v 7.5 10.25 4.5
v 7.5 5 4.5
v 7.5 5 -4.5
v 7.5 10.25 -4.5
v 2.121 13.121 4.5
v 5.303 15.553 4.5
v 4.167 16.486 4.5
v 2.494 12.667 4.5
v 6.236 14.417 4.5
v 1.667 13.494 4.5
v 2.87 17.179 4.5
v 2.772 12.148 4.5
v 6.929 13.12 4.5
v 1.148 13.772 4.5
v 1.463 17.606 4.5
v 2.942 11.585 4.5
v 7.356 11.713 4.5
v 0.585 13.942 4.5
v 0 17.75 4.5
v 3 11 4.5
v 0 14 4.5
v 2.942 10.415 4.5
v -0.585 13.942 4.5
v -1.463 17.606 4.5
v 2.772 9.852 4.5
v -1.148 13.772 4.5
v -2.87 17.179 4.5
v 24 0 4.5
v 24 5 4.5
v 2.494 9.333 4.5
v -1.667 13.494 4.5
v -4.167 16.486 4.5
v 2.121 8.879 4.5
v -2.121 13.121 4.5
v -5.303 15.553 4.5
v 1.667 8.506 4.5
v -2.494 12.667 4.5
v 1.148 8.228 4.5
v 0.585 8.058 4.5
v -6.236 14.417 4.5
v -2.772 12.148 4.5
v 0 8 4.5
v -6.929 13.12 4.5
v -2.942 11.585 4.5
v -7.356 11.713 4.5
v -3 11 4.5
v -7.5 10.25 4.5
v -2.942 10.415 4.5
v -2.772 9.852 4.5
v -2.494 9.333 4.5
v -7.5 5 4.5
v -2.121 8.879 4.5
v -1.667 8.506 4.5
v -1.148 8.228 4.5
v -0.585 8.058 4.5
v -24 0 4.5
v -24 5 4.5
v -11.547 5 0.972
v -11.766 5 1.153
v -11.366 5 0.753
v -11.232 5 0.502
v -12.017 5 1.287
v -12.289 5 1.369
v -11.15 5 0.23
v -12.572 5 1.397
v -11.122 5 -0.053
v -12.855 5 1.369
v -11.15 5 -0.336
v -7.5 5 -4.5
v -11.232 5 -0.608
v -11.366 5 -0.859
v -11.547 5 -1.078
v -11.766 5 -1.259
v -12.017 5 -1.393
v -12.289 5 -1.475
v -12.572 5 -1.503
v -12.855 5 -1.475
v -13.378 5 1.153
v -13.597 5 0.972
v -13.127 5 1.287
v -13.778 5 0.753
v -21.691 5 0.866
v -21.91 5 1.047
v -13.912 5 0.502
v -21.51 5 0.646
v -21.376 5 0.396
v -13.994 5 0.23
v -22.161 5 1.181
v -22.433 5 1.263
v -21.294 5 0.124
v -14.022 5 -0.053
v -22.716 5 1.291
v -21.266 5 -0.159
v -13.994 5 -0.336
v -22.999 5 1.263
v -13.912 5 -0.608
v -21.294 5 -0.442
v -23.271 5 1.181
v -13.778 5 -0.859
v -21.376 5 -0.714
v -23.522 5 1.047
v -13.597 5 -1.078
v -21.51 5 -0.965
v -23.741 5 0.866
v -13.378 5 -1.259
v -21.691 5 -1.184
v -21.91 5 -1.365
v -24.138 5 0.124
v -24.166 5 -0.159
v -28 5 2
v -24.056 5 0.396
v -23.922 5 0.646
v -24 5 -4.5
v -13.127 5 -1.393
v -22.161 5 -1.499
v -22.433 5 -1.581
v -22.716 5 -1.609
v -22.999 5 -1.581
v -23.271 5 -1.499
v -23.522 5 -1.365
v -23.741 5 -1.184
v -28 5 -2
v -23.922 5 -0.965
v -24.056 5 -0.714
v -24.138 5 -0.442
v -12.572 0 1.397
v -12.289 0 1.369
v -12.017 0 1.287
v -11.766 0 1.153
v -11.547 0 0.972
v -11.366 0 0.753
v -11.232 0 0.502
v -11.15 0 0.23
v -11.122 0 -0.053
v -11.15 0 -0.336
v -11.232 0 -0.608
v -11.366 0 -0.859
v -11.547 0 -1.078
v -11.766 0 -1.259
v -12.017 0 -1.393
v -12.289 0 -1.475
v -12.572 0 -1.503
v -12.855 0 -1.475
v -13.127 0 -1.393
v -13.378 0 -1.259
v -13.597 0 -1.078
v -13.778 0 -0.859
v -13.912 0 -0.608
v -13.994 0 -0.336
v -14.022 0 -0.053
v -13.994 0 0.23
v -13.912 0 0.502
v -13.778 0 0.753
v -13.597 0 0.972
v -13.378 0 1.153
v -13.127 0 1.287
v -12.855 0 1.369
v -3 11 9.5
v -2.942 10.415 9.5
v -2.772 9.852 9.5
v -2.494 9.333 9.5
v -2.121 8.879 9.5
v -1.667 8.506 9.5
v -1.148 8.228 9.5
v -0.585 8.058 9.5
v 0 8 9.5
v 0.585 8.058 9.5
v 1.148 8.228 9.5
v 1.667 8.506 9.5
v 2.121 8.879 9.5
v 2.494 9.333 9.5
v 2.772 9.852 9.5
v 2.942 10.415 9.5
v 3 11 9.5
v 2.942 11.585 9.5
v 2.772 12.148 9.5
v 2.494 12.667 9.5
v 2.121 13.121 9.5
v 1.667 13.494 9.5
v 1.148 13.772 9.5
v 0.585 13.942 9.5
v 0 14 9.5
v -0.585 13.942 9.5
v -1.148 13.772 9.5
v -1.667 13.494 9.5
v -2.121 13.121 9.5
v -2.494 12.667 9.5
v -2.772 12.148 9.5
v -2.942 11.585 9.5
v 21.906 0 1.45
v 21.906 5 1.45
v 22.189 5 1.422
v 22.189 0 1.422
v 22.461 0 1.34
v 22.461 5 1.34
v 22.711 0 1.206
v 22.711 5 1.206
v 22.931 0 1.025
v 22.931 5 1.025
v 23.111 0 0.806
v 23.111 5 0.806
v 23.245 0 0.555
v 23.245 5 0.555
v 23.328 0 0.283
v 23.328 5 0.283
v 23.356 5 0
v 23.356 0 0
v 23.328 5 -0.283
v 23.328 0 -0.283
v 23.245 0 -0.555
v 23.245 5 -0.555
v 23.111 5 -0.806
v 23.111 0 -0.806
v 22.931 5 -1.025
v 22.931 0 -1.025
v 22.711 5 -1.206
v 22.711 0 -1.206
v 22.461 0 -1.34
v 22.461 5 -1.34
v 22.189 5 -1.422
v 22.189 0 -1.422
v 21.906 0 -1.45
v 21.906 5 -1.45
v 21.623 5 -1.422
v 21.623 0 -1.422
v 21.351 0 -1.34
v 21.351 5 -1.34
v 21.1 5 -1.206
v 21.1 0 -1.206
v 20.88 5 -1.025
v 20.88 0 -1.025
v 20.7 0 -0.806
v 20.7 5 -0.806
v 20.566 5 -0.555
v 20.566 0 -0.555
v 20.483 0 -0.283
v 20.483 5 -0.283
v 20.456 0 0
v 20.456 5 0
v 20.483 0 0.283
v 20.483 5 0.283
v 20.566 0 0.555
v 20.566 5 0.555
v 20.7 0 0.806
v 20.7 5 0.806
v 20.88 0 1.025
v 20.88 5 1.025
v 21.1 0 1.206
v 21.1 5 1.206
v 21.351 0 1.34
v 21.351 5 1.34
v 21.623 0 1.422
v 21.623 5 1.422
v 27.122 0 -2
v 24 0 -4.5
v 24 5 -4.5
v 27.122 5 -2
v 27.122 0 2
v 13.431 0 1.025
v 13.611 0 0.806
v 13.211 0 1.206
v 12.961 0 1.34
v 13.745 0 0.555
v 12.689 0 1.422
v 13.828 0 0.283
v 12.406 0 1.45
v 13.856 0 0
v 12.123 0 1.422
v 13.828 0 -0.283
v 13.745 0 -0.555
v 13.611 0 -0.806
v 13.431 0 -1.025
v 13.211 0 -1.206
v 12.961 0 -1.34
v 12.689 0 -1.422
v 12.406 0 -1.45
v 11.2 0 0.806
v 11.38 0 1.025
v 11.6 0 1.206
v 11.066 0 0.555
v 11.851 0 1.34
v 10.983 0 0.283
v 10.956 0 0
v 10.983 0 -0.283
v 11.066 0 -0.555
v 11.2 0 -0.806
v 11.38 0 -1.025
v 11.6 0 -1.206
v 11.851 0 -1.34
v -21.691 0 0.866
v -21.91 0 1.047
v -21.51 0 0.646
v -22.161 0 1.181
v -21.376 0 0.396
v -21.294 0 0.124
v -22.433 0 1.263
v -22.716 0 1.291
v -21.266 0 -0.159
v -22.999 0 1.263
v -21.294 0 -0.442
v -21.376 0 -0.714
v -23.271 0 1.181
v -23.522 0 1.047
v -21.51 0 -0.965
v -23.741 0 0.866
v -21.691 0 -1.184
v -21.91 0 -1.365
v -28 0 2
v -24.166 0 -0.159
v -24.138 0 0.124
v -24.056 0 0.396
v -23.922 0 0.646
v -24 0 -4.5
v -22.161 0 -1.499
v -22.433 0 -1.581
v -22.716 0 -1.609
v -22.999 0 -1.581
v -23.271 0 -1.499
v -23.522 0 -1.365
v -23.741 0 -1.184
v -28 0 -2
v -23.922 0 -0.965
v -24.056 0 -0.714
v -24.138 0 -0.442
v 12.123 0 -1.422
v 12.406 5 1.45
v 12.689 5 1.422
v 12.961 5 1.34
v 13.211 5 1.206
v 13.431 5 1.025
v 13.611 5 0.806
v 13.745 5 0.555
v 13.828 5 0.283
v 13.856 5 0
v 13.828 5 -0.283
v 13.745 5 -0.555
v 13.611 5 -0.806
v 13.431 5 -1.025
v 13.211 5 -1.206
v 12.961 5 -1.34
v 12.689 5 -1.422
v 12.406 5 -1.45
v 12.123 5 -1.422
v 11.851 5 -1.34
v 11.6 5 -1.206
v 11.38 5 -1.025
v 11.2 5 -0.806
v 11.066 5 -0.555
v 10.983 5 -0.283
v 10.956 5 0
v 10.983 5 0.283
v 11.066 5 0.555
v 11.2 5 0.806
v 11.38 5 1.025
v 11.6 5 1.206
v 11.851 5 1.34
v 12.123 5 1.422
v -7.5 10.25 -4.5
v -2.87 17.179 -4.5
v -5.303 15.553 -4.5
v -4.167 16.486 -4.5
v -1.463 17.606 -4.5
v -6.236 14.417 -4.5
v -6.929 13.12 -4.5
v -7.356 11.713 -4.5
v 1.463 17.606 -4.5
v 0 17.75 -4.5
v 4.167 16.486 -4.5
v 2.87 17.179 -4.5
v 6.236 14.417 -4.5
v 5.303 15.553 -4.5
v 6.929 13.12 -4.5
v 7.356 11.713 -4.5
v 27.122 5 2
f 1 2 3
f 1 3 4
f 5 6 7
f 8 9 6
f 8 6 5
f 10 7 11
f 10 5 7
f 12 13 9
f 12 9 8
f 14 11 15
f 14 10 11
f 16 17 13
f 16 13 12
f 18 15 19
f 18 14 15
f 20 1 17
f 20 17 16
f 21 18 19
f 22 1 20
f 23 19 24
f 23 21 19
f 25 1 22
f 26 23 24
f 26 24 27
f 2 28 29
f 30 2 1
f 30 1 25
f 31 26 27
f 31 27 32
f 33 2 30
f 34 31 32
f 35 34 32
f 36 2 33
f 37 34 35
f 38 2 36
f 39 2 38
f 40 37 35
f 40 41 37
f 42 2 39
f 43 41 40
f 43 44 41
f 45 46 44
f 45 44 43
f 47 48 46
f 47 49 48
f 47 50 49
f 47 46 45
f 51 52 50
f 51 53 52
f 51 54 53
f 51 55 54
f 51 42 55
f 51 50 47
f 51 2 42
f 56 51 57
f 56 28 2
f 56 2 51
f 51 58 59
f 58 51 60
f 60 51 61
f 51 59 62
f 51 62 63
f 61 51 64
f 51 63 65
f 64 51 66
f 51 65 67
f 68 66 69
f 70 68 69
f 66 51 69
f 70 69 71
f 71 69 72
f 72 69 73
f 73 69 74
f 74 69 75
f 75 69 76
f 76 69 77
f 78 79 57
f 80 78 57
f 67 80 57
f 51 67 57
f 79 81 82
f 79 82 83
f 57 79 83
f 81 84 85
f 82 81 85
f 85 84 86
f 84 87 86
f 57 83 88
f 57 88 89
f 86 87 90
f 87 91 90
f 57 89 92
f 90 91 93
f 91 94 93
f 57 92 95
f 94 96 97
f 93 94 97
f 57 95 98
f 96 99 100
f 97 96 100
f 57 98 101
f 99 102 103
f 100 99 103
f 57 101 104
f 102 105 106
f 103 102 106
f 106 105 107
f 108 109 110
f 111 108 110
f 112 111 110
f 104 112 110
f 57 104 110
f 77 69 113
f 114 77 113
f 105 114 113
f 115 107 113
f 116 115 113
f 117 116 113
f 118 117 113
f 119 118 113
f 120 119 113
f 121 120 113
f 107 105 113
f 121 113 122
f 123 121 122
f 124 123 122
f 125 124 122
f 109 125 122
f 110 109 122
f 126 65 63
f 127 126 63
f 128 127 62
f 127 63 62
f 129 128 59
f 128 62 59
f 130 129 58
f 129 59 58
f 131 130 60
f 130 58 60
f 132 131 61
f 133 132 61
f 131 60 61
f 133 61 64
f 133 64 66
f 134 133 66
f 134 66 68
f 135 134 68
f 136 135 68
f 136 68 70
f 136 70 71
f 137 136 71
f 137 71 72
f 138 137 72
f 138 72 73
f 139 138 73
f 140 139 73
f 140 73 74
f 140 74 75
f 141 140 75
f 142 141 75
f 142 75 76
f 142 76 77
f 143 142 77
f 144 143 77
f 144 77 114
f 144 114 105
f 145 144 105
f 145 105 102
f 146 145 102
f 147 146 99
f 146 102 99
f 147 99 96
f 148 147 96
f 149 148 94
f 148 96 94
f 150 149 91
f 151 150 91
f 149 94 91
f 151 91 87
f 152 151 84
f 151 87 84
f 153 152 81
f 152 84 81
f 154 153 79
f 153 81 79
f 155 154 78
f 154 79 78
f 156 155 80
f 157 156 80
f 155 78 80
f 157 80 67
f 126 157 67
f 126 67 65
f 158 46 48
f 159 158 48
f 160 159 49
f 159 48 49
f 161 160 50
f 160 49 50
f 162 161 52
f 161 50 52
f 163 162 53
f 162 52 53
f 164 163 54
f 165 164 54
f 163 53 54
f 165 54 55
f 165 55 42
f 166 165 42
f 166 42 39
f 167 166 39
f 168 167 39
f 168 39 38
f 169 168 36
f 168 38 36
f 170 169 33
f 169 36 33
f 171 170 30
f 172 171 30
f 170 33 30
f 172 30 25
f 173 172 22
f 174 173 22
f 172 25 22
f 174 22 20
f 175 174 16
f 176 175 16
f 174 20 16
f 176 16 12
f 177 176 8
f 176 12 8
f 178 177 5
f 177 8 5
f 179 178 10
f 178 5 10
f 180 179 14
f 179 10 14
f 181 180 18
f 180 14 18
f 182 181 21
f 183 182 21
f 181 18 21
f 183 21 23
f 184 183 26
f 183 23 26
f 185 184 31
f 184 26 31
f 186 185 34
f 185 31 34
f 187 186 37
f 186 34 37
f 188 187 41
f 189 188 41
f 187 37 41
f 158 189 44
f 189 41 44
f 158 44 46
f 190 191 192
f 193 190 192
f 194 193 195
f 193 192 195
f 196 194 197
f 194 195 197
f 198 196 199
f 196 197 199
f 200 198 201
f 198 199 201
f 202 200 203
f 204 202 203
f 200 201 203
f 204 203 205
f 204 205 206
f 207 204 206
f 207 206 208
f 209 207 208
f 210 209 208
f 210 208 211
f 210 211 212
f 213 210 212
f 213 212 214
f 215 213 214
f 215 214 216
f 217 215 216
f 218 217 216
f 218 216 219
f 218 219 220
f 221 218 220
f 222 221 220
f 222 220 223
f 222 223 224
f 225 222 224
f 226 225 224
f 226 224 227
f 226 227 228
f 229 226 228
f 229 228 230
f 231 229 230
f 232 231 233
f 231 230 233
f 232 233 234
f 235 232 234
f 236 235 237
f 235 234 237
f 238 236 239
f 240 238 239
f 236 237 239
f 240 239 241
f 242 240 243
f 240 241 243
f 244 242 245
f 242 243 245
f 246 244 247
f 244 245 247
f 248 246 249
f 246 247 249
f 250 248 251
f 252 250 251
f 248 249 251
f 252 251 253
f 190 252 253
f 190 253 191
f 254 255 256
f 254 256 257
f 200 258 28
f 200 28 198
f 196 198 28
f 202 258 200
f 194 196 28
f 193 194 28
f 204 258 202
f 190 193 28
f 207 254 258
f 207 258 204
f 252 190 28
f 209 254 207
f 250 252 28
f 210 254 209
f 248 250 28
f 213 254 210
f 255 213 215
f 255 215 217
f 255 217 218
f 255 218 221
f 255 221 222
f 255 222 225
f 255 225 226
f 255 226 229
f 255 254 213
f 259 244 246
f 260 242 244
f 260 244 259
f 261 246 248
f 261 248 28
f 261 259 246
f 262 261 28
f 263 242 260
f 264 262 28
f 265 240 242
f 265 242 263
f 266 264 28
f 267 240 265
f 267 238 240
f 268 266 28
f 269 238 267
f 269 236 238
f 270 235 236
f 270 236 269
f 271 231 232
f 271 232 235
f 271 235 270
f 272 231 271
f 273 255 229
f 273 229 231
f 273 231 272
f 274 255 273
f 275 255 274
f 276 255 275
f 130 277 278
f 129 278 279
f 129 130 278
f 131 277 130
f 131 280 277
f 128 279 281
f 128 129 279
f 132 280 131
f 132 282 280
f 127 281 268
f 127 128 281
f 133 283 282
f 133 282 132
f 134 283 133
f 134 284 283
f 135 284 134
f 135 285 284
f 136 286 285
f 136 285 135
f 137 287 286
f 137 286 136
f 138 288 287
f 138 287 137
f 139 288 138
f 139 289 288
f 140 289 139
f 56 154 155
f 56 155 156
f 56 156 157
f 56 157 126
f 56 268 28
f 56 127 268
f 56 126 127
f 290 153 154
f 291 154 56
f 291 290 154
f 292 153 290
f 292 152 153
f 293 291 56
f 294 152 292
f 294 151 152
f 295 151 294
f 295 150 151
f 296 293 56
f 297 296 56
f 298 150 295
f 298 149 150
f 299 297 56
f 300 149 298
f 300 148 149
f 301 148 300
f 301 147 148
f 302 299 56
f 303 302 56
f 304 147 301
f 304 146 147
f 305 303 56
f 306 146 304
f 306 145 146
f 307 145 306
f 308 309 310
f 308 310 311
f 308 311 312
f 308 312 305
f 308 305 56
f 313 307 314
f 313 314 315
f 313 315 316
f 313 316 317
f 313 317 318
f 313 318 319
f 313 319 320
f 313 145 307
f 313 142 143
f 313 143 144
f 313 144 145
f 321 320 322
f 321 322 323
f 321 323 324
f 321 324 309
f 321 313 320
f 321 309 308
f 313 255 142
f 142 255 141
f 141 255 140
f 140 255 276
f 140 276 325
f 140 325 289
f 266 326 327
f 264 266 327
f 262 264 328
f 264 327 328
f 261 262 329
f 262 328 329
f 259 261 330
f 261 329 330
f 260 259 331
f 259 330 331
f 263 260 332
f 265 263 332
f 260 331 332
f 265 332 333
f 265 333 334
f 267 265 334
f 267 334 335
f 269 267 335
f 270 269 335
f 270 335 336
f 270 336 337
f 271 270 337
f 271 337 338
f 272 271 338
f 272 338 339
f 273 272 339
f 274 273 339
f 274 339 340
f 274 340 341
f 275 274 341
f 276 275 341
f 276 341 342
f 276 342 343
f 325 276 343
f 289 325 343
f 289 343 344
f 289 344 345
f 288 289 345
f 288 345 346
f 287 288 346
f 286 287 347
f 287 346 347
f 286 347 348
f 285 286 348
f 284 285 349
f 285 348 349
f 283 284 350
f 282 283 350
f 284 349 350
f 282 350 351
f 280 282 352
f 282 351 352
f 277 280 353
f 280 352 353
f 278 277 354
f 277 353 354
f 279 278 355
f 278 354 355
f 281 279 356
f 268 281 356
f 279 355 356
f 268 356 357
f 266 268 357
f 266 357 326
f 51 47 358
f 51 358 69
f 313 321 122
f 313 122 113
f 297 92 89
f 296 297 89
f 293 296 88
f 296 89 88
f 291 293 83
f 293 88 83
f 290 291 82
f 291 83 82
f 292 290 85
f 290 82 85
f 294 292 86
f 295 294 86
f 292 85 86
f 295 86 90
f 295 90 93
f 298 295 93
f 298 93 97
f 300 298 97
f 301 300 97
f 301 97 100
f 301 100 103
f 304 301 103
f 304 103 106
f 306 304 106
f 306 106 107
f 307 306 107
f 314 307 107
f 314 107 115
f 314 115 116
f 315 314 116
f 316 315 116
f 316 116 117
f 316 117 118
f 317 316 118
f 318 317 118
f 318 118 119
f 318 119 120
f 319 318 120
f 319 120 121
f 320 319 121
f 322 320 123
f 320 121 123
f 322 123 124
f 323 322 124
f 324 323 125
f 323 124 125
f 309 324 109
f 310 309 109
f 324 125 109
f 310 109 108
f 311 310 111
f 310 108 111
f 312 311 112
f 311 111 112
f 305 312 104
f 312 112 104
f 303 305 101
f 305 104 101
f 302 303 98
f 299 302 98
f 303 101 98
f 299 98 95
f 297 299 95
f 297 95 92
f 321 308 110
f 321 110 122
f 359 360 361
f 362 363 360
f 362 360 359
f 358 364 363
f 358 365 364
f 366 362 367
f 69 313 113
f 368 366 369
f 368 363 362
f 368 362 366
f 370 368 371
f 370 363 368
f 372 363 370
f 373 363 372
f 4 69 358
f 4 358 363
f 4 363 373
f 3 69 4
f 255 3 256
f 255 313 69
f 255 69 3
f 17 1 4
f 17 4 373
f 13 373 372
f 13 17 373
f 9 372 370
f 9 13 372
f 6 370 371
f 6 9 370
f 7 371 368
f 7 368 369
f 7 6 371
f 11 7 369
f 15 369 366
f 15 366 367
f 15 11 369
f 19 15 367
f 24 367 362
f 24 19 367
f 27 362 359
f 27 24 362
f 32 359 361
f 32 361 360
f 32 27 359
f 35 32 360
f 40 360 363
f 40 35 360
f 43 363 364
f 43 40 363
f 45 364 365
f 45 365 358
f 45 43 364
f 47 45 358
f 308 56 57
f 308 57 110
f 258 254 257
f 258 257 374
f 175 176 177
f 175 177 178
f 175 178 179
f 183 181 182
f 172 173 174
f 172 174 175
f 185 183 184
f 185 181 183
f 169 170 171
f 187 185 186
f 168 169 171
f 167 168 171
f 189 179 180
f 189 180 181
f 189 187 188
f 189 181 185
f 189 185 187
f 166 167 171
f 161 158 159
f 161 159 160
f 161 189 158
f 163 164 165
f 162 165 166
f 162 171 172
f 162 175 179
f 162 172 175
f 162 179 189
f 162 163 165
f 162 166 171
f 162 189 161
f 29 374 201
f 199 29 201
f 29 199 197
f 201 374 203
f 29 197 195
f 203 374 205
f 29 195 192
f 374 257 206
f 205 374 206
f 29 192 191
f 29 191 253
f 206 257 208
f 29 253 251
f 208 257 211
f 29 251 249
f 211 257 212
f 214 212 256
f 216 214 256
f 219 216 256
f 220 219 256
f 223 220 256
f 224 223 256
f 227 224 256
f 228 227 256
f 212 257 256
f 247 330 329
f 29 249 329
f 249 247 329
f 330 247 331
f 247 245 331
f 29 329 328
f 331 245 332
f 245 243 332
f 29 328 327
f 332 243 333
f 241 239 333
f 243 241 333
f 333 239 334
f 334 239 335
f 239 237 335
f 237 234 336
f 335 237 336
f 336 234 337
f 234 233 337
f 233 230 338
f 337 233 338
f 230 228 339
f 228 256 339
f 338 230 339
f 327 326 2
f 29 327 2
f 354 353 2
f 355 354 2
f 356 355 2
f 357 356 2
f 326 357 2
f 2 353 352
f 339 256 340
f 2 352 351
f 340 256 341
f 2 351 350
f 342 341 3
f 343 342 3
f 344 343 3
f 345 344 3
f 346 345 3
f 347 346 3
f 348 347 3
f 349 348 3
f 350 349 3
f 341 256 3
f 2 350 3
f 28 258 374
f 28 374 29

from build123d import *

# Parameters (mm, degrees)
DODANIE_WYCI_GNI_CIE1_DEPTH = 5
DODANIE_WYCI_GNI_CIE2_DEPTH = 9
SZKIC4_R                    = 1.45
WYTNIJ_WYCI_GNI_CIE1_DEPTH  = 6
SZKIC3_R                    = 3
DODANIE_WYCI_GNI_CIE3_DEPTH = 5


with BuildPart() as part:
    # Szkic1 → Dodanie-wyciągnięcie1 (new body)
    with BuildSketch(Plane(origin=(0, 0, 0), x_dir=(1, 0, 0), z_dir=(0, 1, 0))):
        Polygon((24, 4.5), (27.122498999, 2), (27.122498999, -2), (24, -4.5), (-24, -4.5), (-28, -2), (-28, 2), (-24, 4.5), align=None)
    extrude(amount=DODANIE_WYCI_GNI_CIE1_DEPTH)

    # Szkic2 → Dodanie-wyciągnięcie2 (add)
    with BuildSketch(Plane.XY.offset(4.5)):
        with BuildLine():
            Line((-7.5, 5), (7.5, 5))
            Line((7.5, 5), (7.5, 10.25))
            ThreePointArc((7.5, 10.25), (0, 17.75), (-7.5, 10.25))
            Line((-7.5, 10.25), (-7.5, 5))
        make_face()
    extrude(amount=-DODANIE_WYCI_GNI_CIE2_DEPTH)

    # Szkic4 → Wytnij-wyciągnięcie1 (cut)
    with BuildSketch(Plane(origin=(0, 5, 0), x_dir=(1, 0, 0), z_dir=(0, 1, 0))):
        with Locations(Location((12.40562475, 0, 0), (0, 0, 270))):
            Circle(SZKIC4_R)
        with Locations(Location((21.90562475, 0, 0), (0, 0, 270))):
            Circle(SZKIC4_R)
        with Locations(Location((-12.57201541, 0.053033314, 0), (0, 0, 270))):
            Circle(SZKIC4_R)
        with Locations(Location((-22.71604623, 0.159099943, 0), (0, 0, 270))):
            Circle(SZKIC4_R)
    extrude(amount=-WYTNIJ_WYCI_GNI_CIE1_DEPTH, mode=Mode.SUBTRACT)

    # Szkic3 → Dodanie-wyciągnięcie3 (add)
    with BuildSketch(Plane.XY.offset(4.5)):
        with Locations(Location((0, 11, 0), (0, 0, 180))):
            Circle(SZKIC3_R)
    extrude(amount=DODANIE_WYCI_GNI_CIE3_DEPTH)


solid = part.part
